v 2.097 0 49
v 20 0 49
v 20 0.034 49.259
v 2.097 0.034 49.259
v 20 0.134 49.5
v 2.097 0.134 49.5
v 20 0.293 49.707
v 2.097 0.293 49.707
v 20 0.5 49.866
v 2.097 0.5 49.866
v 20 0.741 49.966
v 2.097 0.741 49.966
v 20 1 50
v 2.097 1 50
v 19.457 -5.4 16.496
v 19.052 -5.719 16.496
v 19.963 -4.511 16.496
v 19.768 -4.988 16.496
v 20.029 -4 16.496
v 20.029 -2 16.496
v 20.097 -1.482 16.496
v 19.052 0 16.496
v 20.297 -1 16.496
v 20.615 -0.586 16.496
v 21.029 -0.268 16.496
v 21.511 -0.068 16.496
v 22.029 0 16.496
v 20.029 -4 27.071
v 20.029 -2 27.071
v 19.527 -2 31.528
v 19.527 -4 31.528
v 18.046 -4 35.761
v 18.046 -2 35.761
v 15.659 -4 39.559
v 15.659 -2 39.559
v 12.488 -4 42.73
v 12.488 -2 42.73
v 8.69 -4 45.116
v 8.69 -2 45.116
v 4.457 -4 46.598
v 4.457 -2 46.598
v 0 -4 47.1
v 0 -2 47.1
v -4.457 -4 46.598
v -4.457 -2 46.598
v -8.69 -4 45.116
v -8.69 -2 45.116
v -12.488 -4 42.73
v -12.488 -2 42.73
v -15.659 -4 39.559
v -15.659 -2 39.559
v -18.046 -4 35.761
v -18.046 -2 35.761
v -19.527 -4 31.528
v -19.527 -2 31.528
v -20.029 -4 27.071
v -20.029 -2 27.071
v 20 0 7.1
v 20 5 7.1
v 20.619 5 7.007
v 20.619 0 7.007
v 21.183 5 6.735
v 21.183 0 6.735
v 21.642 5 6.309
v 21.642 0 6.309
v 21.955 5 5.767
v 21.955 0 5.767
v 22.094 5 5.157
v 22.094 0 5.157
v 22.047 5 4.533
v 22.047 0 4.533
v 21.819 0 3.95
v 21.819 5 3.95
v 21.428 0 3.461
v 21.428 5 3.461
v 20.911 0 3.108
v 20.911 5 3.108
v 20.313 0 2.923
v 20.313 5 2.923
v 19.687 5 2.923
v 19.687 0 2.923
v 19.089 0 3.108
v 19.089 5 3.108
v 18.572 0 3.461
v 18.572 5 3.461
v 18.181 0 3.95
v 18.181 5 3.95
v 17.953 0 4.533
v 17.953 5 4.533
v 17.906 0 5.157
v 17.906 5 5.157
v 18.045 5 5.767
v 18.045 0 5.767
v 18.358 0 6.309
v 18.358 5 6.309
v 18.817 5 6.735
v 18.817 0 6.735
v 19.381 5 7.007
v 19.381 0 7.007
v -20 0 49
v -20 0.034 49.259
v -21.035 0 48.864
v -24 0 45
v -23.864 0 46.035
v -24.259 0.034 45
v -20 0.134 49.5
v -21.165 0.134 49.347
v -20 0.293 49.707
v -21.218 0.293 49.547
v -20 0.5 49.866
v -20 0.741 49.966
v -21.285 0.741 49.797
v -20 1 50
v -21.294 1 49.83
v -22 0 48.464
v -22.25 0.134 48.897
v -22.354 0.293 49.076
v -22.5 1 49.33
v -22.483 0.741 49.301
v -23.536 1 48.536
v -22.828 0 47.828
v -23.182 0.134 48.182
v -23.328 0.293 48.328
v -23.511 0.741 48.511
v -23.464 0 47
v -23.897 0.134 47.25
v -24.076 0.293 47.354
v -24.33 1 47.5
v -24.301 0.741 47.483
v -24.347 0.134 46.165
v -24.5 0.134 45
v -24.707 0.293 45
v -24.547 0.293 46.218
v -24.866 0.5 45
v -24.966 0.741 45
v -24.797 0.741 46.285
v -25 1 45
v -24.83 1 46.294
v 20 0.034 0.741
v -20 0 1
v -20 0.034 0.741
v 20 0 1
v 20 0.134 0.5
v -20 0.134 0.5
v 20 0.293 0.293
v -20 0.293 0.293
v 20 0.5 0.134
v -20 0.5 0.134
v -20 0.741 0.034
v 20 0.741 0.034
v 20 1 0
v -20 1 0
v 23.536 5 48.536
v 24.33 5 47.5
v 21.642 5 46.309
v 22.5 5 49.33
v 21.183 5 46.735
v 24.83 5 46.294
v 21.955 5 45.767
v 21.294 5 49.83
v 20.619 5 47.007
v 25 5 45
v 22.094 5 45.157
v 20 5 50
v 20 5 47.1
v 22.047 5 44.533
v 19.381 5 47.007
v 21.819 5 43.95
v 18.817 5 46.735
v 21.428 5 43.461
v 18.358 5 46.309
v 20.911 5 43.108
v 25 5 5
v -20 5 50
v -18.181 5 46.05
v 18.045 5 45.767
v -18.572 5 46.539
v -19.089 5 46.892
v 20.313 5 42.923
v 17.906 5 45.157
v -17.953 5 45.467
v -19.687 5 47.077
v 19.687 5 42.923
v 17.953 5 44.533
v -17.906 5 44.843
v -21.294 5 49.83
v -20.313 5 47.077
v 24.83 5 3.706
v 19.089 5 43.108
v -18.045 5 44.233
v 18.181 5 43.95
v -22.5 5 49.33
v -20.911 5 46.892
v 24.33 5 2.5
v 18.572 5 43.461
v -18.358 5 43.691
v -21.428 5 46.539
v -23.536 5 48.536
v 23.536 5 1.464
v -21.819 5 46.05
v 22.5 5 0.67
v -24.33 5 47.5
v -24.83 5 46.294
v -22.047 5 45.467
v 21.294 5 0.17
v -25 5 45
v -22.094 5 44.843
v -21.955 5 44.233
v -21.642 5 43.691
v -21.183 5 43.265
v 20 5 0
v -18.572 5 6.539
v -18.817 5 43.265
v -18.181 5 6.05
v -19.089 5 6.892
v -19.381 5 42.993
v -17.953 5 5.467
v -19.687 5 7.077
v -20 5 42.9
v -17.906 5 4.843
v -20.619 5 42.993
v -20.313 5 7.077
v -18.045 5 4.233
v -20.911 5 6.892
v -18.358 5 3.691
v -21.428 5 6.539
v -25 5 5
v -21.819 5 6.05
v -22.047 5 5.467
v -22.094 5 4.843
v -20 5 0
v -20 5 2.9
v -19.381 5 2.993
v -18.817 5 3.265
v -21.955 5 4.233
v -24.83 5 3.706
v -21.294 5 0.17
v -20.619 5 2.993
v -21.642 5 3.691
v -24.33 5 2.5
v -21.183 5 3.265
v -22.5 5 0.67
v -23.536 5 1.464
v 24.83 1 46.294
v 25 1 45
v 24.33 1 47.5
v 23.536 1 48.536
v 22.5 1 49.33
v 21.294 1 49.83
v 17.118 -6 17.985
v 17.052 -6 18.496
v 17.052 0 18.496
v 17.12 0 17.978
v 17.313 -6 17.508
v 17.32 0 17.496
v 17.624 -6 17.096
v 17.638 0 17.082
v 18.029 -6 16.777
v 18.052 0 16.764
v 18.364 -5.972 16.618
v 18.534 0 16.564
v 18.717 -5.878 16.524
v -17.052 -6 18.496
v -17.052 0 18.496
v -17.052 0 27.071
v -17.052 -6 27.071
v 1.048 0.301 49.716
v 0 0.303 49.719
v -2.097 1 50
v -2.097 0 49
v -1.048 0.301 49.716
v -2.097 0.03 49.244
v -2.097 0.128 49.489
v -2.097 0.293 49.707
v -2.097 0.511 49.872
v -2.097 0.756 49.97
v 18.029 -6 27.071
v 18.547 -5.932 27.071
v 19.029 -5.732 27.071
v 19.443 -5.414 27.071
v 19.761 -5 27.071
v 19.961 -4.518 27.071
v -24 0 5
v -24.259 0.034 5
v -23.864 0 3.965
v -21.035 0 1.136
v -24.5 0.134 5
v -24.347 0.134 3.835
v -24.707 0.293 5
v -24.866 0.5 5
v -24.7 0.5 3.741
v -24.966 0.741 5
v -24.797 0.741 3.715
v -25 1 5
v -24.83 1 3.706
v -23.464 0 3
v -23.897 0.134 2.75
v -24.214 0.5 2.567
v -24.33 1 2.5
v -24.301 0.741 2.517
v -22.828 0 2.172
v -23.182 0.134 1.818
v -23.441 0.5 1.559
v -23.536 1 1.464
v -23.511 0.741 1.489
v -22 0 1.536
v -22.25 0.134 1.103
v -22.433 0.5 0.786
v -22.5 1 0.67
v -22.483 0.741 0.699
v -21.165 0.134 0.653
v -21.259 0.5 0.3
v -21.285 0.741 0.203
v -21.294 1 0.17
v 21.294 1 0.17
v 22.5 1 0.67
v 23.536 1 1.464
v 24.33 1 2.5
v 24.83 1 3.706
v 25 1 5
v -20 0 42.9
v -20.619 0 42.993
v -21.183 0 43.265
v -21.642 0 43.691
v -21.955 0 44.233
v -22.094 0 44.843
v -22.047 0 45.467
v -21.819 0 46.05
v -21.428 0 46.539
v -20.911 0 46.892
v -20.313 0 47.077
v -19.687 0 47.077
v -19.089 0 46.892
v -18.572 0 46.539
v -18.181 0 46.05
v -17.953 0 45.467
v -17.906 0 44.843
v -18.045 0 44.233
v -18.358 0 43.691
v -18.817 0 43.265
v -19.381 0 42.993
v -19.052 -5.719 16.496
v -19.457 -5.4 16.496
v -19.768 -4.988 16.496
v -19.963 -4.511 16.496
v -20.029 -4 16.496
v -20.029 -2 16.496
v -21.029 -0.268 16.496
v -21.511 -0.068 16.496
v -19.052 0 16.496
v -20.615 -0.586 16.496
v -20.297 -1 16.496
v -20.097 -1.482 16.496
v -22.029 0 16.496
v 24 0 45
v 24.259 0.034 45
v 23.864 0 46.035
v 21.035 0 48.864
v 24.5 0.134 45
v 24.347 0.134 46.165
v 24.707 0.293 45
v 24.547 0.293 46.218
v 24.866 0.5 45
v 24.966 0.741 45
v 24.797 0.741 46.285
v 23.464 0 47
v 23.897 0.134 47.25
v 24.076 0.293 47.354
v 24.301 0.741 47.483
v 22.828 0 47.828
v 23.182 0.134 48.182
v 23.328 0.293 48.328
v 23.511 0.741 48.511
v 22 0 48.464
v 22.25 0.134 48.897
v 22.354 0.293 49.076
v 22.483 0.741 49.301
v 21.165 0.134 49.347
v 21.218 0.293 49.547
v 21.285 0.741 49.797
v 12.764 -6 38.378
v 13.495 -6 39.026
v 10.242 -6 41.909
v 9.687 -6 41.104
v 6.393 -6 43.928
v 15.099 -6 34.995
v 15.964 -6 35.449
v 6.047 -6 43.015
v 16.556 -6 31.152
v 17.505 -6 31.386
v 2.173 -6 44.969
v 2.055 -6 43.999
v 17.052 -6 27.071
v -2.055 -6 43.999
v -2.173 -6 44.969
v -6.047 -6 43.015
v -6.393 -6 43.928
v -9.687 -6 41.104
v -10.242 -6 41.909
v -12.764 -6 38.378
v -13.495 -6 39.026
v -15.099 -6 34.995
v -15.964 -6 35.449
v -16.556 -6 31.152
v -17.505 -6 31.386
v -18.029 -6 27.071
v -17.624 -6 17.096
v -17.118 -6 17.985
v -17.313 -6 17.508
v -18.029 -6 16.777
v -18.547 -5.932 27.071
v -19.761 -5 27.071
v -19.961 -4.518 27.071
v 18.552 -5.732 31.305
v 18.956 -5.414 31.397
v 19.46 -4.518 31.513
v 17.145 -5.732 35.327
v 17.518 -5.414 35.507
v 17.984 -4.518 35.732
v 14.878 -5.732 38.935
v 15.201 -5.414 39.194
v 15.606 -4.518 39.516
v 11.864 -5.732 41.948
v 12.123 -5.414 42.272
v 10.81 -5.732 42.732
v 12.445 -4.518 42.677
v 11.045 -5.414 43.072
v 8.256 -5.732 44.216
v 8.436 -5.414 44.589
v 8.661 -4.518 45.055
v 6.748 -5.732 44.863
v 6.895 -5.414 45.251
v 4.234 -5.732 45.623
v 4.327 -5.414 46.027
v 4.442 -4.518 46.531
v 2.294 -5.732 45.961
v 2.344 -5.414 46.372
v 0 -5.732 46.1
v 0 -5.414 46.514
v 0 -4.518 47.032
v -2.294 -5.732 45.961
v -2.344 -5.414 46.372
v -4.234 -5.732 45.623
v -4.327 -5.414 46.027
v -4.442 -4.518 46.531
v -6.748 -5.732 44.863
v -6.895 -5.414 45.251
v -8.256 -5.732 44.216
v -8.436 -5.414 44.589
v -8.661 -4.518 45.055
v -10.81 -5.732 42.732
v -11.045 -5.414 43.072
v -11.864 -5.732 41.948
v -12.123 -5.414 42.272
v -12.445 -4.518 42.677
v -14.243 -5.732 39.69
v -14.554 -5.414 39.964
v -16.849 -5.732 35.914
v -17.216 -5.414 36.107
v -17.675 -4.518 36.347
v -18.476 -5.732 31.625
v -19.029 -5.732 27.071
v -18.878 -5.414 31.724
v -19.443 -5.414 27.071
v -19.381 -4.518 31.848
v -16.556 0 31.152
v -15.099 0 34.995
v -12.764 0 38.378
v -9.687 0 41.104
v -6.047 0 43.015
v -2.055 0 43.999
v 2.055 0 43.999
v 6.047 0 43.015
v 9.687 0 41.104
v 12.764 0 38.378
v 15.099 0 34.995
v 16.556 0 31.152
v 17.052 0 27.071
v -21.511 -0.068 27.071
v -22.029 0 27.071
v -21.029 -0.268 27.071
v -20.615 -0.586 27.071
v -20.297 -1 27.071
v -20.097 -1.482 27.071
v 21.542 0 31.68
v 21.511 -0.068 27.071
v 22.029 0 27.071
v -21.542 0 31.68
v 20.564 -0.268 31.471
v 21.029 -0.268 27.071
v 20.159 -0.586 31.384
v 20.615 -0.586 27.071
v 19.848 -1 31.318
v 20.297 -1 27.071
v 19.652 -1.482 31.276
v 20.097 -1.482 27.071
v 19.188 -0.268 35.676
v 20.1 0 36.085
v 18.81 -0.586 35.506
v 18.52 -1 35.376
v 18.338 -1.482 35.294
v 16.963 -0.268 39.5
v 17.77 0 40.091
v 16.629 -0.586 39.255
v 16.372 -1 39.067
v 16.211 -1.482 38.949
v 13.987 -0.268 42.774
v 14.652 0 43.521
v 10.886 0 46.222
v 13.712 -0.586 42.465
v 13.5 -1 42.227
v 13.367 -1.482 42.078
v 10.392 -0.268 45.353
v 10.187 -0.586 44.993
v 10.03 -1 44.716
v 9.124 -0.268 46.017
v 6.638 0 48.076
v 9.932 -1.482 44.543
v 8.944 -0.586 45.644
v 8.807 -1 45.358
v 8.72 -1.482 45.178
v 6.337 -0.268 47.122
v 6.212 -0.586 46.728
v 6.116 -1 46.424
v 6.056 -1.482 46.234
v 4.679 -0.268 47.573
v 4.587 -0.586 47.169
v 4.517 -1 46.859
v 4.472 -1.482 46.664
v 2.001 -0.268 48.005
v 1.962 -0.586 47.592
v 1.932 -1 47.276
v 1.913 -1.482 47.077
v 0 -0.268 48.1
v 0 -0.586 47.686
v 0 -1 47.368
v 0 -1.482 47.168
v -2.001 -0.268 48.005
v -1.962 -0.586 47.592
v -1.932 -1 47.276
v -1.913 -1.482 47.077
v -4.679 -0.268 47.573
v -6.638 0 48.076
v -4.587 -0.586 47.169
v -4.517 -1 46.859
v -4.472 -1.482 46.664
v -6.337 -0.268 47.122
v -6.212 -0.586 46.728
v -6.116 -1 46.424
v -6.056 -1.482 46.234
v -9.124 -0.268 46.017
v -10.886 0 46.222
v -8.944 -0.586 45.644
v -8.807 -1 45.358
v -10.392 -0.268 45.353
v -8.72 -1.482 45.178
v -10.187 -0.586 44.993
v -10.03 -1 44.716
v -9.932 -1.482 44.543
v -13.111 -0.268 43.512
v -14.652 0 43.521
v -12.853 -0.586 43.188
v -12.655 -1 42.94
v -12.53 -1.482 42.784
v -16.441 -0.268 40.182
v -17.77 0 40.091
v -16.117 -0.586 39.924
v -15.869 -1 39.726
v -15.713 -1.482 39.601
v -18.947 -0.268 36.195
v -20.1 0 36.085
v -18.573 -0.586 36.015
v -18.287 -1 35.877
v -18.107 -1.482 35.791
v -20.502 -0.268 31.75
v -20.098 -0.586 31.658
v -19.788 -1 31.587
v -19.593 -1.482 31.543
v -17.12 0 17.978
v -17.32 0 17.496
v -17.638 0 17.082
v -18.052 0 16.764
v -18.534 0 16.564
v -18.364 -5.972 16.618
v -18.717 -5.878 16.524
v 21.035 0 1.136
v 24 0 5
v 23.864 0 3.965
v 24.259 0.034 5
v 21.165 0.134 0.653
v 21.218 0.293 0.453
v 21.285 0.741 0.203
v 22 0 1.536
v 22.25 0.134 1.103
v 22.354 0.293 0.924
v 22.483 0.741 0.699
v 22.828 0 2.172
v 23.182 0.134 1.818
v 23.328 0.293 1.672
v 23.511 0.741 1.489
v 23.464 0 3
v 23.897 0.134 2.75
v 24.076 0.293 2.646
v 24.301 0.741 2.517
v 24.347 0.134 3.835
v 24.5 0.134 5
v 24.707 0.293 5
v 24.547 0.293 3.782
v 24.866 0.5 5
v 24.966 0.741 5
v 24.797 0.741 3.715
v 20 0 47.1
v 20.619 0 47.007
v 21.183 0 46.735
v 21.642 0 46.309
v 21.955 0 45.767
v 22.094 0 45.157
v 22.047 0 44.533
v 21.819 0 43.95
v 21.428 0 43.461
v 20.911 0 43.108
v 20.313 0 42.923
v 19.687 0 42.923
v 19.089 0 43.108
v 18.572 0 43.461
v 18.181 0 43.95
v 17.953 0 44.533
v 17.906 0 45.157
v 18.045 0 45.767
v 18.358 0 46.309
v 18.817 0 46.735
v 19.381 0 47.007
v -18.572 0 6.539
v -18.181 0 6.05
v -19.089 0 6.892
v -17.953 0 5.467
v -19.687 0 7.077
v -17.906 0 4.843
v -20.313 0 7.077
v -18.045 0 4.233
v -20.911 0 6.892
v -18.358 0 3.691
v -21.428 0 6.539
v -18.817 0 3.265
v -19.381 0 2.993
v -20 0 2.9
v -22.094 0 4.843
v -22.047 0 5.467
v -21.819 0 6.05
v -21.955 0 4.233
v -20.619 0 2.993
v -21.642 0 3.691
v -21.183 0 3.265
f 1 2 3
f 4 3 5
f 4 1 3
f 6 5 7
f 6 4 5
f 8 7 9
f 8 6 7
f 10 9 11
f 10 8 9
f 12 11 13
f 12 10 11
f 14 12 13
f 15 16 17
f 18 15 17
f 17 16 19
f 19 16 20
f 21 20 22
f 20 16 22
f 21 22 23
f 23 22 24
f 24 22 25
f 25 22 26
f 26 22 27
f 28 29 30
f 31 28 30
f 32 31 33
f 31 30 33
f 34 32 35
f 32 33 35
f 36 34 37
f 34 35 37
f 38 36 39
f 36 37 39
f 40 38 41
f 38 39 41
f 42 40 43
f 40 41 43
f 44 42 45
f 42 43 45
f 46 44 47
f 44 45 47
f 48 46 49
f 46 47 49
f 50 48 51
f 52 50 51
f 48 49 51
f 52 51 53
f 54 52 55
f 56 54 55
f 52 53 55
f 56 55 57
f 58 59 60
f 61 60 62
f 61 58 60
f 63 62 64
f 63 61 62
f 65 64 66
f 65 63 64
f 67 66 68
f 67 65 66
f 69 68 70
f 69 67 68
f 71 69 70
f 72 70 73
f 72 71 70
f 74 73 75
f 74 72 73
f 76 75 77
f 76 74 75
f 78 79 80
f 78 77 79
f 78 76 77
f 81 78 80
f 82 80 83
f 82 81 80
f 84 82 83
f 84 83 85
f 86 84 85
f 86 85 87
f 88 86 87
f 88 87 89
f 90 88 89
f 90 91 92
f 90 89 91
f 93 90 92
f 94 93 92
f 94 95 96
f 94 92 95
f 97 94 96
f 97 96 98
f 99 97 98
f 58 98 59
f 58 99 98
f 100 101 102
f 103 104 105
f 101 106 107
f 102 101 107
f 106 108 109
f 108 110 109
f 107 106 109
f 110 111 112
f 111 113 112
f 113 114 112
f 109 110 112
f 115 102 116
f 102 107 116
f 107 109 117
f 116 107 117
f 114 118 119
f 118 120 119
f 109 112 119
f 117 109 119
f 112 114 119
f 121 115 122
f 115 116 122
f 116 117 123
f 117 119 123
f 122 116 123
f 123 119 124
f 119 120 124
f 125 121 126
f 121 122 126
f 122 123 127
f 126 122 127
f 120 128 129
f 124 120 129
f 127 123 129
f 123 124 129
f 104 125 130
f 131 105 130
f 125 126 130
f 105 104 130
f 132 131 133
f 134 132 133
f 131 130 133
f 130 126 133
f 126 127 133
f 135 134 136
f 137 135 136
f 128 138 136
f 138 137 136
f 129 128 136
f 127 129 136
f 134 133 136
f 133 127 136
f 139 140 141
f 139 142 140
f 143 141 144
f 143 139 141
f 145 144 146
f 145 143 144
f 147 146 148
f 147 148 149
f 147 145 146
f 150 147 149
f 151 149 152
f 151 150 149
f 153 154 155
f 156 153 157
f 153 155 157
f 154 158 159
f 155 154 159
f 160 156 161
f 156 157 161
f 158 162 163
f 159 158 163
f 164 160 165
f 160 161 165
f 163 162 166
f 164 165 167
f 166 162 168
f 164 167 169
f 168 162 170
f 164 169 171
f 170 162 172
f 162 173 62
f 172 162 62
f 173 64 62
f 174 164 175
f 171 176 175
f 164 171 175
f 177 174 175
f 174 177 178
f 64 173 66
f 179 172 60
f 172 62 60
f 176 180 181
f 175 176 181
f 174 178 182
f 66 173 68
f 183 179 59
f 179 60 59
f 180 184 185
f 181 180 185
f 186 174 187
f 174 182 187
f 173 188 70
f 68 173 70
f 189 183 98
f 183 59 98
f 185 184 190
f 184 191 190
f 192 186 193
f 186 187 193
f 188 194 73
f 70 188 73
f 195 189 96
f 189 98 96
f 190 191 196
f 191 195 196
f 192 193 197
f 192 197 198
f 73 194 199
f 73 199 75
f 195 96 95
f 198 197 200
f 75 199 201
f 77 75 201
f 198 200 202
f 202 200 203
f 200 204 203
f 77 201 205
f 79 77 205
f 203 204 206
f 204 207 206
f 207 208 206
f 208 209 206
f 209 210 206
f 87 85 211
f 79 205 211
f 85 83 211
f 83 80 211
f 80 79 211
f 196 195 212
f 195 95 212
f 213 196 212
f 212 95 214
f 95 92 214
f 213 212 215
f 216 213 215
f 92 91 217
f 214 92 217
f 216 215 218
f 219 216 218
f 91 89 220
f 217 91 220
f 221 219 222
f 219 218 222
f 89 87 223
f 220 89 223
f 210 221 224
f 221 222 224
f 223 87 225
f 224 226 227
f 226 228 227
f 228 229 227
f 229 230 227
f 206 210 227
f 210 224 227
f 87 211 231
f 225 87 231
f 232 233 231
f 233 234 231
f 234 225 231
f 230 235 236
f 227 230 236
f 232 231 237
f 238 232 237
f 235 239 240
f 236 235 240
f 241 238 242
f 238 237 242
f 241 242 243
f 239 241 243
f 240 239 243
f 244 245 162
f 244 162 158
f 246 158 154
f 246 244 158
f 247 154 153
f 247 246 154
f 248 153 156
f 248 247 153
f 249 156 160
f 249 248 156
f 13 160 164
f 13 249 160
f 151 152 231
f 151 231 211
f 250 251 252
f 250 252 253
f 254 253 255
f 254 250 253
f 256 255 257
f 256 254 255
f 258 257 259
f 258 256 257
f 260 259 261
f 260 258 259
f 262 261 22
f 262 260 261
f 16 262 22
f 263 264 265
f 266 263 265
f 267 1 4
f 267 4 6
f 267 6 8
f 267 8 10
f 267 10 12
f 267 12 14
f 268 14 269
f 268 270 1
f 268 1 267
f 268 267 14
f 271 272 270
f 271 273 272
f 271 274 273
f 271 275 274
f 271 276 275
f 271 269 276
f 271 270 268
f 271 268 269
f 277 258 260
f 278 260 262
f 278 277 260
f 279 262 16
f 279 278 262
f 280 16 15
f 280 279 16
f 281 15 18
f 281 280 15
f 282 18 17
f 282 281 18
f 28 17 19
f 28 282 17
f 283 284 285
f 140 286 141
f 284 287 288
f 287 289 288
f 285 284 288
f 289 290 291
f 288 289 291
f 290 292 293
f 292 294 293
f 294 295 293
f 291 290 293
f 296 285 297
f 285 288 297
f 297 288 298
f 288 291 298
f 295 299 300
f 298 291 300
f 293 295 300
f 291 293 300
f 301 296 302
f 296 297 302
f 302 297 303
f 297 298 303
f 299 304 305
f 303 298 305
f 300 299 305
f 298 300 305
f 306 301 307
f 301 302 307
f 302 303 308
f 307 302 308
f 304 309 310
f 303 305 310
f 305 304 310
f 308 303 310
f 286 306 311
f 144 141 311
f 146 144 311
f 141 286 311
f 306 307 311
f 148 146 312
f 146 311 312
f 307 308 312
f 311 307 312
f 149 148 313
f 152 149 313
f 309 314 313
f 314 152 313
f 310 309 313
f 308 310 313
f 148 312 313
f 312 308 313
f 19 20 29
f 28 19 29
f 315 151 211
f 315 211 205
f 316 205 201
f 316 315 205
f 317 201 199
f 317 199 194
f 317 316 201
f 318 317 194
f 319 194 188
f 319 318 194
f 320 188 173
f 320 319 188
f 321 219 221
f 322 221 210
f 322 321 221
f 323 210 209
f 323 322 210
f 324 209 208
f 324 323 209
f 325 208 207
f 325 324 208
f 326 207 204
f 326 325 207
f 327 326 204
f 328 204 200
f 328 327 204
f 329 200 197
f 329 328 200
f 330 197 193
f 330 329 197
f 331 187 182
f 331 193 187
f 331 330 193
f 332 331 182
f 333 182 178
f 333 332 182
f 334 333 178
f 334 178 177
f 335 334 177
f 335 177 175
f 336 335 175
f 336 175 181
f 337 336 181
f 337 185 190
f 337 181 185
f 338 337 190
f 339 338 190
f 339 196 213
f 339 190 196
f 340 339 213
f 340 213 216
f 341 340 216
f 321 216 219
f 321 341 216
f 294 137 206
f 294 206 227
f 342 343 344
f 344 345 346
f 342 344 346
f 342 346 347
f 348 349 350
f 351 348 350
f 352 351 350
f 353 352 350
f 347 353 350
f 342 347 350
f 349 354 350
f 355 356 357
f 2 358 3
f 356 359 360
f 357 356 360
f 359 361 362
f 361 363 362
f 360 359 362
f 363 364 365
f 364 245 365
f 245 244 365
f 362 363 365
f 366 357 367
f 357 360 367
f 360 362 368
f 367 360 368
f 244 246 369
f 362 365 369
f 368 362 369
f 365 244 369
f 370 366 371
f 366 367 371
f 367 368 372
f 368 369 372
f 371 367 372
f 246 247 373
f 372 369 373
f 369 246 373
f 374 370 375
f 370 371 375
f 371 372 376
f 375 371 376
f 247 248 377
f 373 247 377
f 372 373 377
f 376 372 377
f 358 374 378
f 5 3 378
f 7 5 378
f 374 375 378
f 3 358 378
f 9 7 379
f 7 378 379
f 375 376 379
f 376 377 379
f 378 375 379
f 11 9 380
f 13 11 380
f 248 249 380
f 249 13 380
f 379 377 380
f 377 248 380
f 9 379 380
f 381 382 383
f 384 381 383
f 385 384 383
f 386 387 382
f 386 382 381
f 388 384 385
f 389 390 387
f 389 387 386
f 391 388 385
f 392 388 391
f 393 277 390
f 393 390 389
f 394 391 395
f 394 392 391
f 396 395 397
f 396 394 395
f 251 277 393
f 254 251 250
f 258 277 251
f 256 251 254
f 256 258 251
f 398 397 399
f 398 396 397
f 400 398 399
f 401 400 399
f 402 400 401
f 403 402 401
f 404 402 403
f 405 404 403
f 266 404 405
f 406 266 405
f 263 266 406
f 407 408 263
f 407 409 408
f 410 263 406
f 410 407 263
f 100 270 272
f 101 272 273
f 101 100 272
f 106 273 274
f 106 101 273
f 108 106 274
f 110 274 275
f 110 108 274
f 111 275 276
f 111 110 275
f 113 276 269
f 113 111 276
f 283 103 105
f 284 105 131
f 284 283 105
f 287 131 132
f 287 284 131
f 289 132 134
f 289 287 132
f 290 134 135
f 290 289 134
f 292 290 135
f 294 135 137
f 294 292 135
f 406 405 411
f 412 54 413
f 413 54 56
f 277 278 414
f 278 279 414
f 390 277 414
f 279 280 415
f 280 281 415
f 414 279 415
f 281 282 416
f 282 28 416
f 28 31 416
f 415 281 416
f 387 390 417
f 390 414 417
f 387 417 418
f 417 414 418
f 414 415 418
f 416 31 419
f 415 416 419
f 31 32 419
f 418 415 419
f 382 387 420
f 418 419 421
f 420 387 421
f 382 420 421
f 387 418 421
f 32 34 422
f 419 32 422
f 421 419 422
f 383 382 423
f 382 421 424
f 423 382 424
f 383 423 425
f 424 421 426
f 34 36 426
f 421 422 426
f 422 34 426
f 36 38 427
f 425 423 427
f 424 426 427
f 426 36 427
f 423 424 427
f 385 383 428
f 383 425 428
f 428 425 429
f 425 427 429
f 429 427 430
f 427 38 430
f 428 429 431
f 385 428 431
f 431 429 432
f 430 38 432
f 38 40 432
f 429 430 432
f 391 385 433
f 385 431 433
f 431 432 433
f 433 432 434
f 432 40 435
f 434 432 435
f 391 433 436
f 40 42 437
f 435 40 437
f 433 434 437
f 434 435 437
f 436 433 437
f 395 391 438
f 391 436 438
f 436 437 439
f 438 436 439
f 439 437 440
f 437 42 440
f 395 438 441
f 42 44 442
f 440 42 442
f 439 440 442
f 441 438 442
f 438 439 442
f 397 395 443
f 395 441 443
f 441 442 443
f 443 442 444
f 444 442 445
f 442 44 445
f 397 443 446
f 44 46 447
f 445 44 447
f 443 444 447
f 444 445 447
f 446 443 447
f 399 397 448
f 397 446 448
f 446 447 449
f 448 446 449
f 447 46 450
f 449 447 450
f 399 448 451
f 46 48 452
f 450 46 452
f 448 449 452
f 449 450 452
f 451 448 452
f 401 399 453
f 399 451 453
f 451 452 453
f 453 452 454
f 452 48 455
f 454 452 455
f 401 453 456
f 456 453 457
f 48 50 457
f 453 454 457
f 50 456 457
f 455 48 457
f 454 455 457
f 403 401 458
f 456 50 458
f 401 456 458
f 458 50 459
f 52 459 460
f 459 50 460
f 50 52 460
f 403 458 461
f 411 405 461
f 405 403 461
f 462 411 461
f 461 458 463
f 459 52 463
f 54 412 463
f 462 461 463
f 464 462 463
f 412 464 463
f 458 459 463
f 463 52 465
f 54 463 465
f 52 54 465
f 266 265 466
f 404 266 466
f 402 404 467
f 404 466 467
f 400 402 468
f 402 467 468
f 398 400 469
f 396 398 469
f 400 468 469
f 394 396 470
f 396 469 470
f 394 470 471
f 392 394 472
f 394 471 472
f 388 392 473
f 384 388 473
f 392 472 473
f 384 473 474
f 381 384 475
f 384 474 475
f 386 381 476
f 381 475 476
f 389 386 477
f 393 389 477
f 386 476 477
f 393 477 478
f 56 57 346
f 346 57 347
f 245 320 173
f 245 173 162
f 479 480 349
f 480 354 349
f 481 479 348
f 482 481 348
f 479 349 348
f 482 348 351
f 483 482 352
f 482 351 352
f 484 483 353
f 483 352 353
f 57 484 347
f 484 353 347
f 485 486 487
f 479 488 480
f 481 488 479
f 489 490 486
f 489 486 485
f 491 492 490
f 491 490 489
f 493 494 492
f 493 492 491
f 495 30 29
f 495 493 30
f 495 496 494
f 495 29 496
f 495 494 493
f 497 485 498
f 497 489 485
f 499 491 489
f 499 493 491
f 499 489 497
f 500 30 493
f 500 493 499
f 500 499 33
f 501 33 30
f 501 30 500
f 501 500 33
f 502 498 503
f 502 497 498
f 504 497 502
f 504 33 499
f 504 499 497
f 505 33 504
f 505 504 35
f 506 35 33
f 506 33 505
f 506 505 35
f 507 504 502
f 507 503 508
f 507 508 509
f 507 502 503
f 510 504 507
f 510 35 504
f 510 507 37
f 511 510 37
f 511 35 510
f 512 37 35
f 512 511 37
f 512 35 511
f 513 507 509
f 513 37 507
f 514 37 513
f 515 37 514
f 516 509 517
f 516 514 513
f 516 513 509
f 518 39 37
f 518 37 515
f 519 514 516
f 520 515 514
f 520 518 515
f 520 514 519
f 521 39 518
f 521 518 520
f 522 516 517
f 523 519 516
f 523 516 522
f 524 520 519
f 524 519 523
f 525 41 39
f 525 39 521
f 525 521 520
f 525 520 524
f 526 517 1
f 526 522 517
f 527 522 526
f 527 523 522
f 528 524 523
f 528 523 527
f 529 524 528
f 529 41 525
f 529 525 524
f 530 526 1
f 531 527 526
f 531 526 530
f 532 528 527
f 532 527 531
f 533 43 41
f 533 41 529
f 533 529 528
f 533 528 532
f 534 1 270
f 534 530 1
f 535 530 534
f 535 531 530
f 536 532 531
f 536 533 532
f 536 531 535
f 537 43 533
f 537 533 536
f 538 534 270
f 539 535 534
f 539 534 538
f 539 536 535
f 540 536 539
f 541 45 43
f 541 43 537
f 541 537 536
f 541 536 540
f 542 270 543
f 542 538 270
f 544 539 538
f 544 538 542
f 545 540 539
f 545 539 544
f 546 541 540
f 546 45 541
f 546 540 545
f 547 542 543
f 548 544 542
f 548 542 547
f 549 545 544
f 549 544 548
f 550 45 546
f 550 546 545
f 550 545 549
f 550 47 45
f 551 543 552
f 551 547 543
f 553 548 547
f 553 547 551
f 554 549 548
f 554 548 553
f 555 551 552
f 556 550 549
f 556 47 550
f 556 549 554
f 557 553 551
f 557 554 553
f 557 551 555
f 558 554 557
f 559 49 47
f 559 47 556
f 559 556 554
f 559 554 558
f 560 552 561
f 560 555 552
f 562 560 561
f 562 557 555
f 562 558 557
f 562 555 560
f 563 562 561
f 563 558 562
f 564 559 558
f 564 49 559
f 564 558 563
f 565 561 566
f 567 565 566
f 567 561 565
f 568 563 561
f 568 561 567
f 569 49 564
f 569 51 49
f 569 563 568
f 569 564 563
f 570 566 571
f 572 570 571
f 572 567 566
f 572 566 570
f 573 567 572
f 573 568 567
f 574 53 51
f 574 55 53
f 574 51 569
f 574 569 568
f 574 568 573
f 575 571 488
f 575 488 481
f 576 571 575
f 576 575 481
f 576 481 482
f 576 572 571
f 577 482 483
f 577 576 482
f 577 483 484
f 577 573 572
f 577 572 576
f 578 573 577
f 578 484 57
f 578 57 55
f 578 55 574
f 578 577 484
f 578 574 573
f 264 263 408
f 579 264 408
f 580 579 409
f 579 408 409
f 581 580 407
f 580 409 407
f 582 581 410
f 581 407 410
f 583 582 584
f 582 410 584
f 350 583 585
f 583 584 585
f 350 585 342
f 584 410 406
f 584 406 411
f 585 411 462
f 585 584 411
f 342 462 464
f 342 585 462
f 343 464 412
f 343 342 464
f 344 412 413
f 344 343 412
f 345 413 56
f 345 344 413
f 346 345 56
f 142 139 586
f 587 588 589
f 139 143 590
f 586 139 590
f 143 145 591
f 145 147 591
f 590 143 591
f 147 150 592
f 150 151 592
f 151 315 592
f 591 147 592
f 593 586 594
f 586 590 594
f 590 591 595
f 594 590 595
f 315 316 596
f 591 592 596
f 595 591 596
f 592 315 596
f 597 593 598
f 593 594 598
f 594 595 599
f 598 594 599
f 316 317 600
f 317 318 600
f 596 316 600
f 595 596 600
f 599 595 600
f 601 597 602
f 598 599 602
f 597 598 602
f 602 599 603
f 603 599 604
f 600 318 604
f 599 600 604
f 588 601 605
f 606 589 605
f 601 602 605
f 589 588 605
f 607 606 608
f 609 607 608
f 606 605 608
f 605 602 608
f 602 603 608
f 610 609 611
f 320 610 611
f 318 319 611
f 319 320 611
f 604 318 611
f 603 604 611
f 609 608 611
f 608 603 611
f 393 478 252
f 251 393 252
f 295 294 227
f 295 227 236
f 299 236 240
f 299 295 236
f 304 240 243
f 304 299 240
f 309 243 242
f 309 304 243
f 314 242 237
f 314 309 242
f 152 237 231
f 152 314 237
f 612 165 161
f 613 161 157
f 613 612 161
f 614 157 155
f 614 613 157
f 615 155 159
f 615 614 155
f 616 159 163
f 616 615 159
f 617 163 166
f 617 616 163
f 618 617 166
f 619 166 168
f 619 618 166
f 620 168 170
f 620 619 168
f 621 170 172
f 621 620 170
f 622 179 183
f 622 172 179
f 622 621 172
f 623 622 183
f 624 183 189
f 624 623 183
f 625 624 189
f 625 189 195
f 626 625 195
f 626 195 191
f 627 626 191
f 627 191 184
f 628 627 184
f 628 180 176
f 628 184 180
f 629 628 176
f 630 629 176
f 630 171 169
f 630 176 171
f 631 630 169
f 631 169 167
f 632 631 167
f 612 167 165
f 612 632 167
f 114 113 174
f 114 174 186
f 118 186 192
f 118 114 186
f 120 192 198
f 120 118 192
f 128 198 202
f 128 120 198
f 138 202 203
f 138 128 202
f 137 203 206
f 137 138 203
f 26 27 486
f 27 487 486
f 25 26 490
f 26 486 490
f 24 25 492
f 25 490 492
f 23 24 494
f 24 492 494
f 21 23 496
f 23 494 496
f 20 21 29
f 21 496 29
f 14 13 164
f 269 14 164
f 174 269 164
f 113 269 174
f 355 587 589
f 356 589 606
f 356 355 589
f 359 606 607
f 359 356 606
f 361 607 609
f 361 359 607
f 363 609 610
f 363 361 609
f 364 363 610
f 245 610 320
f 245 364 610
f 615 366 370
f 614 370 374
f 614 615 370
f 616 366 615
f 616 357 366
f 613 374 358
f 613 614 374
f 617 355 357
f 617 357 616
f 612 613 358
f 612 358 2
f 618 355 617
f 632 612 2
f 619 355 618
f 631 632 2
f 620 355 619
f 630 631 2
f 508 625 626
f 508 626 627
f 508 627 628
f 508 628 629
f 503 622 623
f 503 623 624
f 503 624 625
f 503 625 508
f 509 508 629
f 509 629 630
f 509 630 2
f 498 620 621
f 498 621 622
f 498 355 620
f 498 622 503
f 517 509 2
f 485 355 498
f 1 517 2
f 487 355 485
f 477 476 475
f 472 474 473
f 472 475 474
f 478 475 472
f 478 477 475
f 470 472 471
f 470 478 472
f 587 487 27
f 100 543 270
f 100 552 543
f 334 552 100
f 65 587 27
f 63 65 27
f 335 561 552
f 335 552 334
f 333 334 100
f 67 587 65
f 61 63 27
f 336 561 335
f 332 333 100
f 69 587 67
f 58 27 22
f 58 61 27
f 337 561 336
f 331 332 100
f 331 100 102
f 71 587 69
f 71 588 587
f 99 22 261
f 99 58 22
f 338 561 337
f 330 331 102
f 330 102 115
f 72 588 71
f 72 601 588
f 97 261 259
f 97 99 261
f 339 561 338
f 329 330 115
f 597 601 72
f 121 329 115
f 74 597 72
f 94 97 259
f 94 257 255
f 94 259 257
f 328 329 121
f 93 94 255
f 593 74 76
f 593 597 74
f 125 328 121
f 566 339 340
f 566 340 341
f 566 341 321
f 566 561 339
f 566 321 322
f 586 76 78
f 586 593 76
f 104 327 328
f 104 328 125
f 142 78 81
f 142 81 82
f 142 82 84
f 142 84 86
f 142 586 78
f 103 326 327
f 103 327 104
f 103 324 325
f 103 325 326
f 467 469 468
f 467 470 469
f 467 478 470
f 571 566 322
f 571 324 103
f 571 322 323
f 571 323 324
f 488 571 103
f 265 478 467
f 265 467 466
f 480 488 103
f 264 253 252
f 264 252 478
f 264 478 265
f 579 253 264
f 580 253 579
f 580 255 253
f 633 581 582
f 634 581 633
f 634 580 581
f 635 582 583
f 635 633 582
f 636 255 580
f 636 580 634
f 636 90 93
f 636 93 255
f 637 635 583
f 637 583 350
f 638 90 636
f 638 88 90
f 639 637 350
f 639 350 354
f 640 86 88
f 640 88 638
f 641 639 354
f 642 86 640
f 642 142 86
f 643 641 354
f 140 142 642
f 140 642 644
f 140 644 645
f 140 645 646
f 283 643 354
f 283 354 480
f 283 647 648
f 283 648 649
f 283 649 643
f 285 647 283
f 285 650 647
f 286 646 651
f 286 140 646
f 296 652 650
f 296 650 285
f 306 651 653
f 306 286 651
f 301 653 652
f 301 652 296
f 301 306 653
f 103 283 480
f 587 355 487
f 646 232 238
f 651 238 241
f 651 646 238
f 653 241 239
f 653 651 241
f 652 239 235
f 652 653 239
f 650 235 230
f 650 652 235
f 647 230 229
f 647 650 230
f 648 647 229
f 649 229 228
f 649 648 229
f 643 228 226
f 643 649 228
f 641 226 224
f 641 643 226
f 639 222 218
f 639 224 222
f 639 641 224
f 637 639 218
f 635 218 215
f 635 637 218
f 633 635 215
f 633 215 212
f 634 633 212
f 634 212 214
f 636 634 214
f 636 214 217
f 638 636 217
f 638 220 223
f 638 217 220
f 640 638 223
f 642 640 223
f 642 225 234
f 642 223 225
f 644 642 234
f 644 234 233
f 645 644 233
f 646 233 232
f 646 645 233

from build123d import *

# Parameters (mm, degrees)
BOSS_EXTRUDE1_DEPTH = 5
SKETCH1_3_R         = 2.1
CUT_EXTRUDE1_DEPTH  = 57.124860802
SKETCH1_4_R         = 2.1
CUT_EXTRUDE2_DEPTH  = 57.124860802
SKETCH1_5_R         = 2.1
CUT_EXTRUDE3_DEPTH  = 57.124860802
SKETCH1_6_R         = 2.1
CUT_EXTRUDE4_DEPTH  = 57.124860802
BOSS_EXTRUDE2_DEPTH = 6
FILLET1_R           = 2
FILLET2_R           = 2
FILLET3_R           = 2
FILLET4_R           = 2
FILLET5_R           = 1


with BuildPart() as part:
    # Sketch1 → Boss-Extrude1 (new body)
    with BuildSketch(Plane(origin=(0, 0, 0), x_dir=(1, 0, 0), z_dir=(0, 1, 0))):
        with BuildLine():
            Line((-20, 0), (20, 0))
            ThreePointArc((20, 0), (23.535533906, -1.464466094), (25, -5))
            Line((25, -5), (25, -45))
            ThreePointArc((25, -45), (23.535533906, -48.535533906), (20, -50))
            Line((20, -50), (-20, -50))
            ThreePointArc((-20, -50), (-23.535533906, -48.535533906), (-25, -45))
            Line((-25, -45), (-25, -5))
            ThreePointArc((-25, -5), (-23.535533906, -1.464466094), (-20, 0))
        make_face()
    extrude(amount=BOSS_EXTRUDE1_DEPTH)

    # Sketch1<3> → Cut-Extrude1 (cut, through all)
    with BuildSketch(Plane(origin=(0, 0, 0), x_dir=(1, 0, 0), z_dir=(0, 1, 0))):
        with Locations((20, -45)):
            Circle(SKETCH1_3_R)
    extrude(amount=CUT_EXTRUDE1_DEPTH, mode=Mode.SUBTRACT)

    # Sketch1<4> → Cut-Extrude2 (cut, through all)
    with BuildSketch(Plane(origin=(0, 0, 0), x_dir=(1, 0, 0), z_dir=(0, 1, 0))):
        with Locations((20, -5)):
            Circle(SKETCH1_4_R)
    extrude(amount=CUT_EXTRUDE2_DEPTH, mode=Mode.SUBTRACT)

    # Sketch1<5> → Cut-Extrude3 (cut, through all)
    with BuildSketch(Plane(origin=(0, 0, 0), x_dir=(1, 0, 0), z_dir=(0, 1, 0))):
        with Locations((-20, -5)):
            Circle(SKETCH1_5_R)
    extrude(amount=CUT_EXTRUDE3_DEPTH, mode=Mode.SUBTRACT)

    # Sketch1<6> → Cut-Extrude4 (cut, through all)
    with BuildSketch(Plane(origin=(0, 0, 0), x_dir=(1, 0, 0), z_dir=(0, 1, 0))):
        with Locations((-20, -45)):
            Circle(SKETCH1_6_R)
    extrude(amount=CUT_EXTRUDE4_DEPTH, mode=Mode.SUBTRACT)

    # Sketch1<8> → Boss-Extrude2 (add)
    with BuildSketch(Plane(origin=(0, 0, 0), x_dir=(1, 0, 0), z_dir=(0, 1, 0))):
        with BuildLine():
            Line((17.051994501, -27.070918511), (17.051994501, -16.496039026))
            Line((17.051994501, -16.496039026), (20.029081489, -16.496039026))
            Line((20.029081489, -16.496039026), (20.029081489, -27.070918511))
            ThreePointArc((20.029081489, -27.070918511), (0, -47.1), (-20.029081489, -27.070918511))
            Line((-20.029081489, -27.070918511), (-20.029081489, -16.496039026))
            Line((-20.029081489, -16.496039026), (-17.051994501, -16.496039026))
            Line((-17.051994501, -16.496039026), (-17.051994501, -27.070918511))
            ThreePointArc((-17.051994501, -27.070918511), (0, -44.122913013), (17.051994501, -27.070918511))
        make_face()
    extrude(amount=-BOSS_EXTRUDE2_DEPTH)

    # Fillet1
    fillet1_edges = [part.edges().sort_by_distance(p)[0] for p in [
        (-20.029081489, 0, 21.783478769),
        (20.029081489, 0, 21.783478769),
        (0, 0, 47.1),
    ]]
    fillet(fillet1_edges, radius=FILLET1_R)

    # Fillet2
    fillet2_edges = [part.edges().sort_by_distance(p)[0] for p in [
        (17.051994501, -3, 16.496039026),
    ]]
    fillet(fillet2_edges, radius=FILLET2_R)

    # Fillet3
    fillet3_edges = [part.edges().sort_by_distance(p)[0] for p in [
        (-17.051994501, -3, 16.496039026),
    ]]
    fillet(fillet3_edges, radius=FILLET3_R)

    # Fillet4
    fillet4_edges = [part.edges().sort_by_distance(p)[0] for p in [
        (-20.029081489, -6, 21.783478769),
        (0, -6, 47.1),
        (20.029081489, -6, 21.783478769),
    ]]
    fillet(fillet4_edges, radius=FILLET4_R)

    # Fillet5
    fillet5_edges = [part.edges().sort_by_distance(p)[0] for p in [
        (-23.535533906, 0, 1.464466094),
        (23.535533906, 0, 1.464466094),
        (25, 0, 25),
        (23.535533906, 0, 48.535533906),
        (0, 0, 50),
        (-23.535533906, 0, 48.535533906),
        (-25, 0, 25),
        (0, 0, 0),
    ]]
    fillet(fillet5_edges, radius=FILLET5_R)


solid = part.part
